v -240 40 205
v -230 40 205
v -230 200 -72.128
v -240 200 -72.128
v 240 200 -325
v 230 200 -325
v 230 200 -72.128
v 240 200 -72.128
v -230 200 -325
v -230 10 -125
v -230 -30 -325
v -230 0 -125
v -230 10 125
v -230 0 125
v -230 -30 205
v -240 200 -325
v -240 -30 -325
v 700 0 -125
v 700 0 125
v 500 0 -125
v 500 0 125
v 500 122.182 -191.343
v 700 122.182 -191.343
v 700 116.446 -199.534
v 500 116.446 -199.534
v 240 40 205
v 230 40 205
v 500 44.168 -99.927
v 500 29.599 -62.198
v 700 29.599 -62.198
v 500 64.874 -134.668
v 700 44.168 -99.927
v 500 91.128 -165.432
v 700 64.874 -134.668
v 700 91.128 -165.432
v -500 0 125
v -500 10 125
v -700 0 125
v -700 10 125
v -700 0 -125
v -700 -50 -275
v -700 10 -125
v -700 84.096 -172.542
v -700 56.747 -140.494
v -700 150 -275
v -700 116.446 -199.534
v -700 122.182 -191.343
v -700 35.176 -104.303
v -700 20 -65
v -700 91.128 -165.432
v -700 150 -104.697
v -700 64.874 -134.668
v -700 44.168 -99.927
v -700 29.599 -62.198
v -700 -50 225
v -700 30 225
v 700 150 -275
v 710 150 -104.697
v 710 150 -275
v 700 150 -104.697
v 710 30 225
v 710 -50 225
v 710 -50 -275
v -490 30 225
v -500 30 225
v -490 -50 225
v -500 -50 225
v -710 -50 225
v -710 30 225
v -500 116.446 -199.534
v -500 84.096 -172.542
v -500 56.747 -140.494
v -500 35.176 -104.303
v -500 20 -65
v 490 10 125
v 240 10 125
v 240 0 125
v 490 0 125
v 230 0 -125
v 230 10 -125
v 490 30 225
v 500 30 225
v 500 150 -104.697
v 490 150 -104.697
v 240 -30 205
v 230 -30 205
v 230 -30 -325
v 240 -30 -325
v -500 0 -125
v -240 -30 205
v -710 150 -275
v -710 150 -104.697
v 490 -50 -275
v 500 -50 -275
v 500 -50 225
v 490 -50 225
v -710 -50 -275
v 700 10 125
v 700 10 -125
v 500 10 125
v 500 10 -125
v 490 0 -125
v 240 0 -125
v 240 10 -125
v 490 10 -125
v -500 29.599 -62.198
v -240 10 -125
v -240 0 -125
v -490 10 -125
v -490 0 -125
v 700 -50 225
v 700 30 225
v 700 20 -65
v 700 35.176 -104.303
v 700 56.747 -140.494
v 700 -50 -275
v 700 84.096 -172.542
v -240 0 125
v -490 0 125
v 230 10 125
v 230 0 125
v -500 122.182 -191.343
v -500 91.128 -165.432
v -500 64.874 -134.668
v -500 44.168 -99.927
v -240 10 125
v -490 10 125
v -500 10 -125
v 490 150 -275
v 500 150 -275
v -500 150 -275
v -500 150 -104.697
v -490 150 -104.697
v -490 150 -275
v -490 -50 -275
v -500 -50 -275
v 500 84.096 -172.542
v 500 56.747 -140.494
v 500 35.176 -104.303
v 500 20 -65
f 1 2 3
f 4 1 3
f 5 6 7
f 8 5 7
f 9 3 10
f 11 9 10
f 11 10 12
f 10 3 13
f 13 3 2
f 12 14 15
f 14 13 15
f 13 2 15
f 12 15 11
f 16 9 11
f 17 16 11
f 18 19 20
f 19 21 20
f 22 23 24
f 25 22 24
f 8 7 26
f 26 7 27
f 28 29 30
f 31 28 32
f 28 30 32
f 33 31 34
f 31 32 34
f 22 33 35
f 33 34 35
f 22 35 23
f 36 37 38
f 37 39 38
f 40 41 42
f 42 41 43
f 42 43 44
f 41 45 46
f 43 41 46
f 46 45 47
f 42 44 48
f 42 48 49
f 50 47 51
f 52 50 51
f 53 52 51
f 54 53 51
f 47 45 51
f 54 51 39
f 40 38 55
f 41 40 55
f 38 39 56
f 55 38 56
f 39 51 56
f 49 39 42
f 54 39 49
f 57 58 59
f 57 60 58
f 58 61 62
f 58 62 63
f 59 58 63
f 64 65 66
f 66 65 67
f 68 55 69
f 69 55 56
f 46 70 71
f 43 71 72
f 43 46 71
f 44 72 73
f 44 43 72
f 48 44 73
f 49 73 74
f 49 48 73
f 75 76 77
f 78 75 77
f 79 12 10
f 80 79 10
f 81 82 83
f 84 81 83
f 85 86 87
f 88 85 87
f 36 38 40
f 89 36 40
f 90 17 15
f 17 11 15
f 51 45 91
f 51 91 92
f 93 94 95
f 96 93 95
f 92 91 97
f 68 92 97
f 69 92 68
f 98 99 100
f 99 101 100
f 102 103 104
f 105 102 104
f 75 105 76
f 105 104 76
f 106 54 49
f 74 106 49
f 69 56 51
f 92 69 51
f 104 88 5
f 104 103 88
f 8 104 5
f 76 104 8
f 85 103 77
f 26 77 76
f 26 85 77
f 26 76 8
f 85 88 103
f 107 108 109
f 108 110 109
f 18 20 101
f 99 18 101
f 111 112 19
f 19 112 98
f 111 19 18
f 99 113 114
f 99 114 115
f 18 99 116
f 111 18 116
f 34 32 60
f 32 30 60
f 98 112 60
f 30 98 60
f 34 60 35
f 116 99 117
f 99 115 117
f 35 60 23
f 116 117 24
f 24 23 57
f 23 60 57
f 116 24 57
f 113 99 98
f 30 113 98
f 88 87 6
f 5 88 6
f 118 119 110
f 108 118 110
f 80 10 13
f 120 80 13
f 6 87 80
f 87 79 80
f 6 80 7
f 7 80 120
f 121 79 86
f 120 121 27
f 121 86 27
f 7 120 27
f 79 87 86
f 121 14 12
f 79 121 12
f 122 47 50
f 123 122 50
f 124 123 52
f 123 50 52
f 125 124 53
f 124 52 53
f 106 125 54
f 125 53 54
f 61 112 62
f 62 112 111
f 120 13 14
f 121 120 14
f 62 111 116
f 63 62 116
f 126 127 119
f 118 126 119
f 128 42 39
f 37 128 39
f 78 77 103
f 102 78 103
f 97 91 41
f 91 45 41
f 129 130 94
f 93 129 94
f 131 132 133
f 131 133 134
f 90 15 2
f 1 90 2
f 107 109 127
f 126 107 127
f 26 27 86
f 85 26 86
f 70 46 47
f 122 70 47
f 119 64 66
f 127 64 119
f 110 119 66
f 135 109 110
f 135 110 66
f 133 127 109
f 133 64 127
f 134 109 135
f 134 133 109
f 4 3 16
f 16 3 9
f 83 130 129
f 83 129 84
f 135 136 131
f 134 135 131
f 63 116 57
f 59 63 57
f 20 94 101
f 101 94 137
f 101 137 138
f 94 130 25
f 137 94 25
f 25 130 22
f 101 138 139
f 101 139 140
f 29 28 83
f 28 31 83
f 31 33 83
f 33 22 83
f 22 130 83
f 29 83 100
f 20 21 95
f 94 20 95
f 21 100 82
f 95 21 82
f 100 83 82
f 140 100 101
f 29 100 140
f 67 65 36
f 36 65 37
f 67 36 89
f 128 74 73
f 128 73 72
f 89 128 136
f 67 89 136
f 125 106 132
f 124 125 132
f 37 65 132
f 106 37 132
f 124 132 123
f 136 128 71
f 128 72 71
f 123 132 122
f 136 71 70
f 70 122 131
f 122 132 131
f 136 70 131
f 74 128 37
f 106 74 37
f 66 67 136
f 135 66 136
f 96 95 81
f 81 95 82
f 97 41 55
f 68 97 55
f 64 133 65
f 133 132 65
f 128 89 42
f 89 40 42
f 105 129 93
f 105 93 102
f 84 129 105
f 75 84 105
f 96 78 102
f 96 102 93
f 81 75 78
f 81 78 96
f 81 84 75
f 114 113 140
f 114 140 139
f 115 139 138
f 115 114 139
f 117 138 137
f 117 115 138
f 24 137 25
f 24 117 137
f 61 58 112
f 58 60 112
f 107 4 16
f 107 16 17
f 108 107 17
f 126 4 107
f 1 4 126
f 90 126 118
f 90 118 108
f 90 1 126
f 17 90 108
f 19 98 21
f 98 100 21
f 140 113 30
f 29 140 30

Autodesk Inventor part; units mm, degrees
sketch "スケッチ1" plane through (0, 0, 0) normal (1, 0, 0) x (0, 1, 0)
  line L0 (10, 125) -> (0, 125)
  line L1 (0, 125) -> (0, -125)
  line L2 (0, -125) -> (10, -125)
  line L3 (10, -125) -> (10, 125)
  point P0 (0, 0)
  dimension "d0" = 250
  dimension "d1" = 10
extrude "押し出し1" add sketch "スケッチ1" along normal mid plane 1400
sketch "スケッチ2" plane through (700, 0, 0) normal (1, 0, 0) x (0, 0, -1)
  line L0 (104.6973, 150) -> (-225, 30)
  line L1 (-225, 30) -> (-225, -50)
  line L2 (-225, -50) -> (275, -50)
  line L3 (275, -50) -> (275, 150)
  line L4 (-125, 0) -> (125, 0) projected
  line L5 (-125, 10) -> (-125, 0) projected
  line L6 (125, 0) -> (125, 10) projected
  line L7 (125, 10) -> (-125, 10) projected
  line L8 (104.6973, 150) -> (275, 150)
  point P0 (0, 0)
  dimension "d4" = 50
  dimension "d5" = 20
  dimension "d6" = 200
  dimension "d7" = 500
  dimension "d8" = 100
  dimension "d9" = 80
extrude "押し出し3" add sketch "スケッチ2" along normal blind 10 contours L8 L3 L2 L1 L0 | L5 L7 L6 L4
ref_plane "作業平面1" through (230, 0, 0) normal (1, 0, 0) x (0, 1, 0)
ref_plane "作業平面2" through (600, 0, 0) normal (-1, 0, 0) x (0, 0, 1)
ref_plane "作業平面3" through (230, 0, 0) normal (1, 0, 0) x (0, 1, 0)
mirror "ミラー3" about plane through (600, 0, 0) normal (-1, 0, 0) of "押し出し3"
sketch "スケッチ4" plane through (230, 0, 0) normal (1, 0, 0) x (0, 1, 0)
  line L0 (40, 205) -> (-30, 205)
  line L1 (-30, 205) -> (-30, -325)
  line L2 (-30, -325) -> (200, -325)
  line L3 (200, -325) -> (200, -72.1281)
  line L4 (200, -72.1281) -> (40, 205)
  line L5 (0, -520.2563) -> (0, 349.2094) projected
  line L6 (30, 225) -> (-50, 225) projected
  line L7 (-50, 225) -> (-50, -275) projected
  line L8 (-50, -275) -> (150, -275) projected
  point P0 (0, 0)
  dimension "d25" = 230
  dimension "d26" = 20
  dimension "d27" = 20
  dimension "d28" = 50
  dimension "d29" = 30
  dimension "d30" = 70
extrude "押し出し5" add sketch "スケッチ4" along normal blind 10 contours L4 L3 L2 L5 L0 | L5 L8 L1 L0 | L5 L2 L1 L8
sketch "スケッチ5" plane through (700, 0, 0) normal (-1, 0, 0) x (0, 0, 1)
  arc A0 (-199.5342, 116.4458) -> (-65, 20) centre (4.9464, 259.6246) ccw
  arc A1 (-191.3426, 122.1816) -> (-62.1979, 29.5994) centre (4.9464, 259.6246) ccw
  line L0 (-65, 20) -> (-62.1979, 29.5994)
  line L1 (-191.3426, 122.1816) -> (-199.5342, 116.4458)
  line L2 (125, 10) -> (-125, 10) projected
  line L3 (-125, 10) -> (-125, 0) projected
  line L4 (-125, 10) -> (-199.5342, 116.4458)
  point P0 (0, 0)
  dimension "d33" = 10
  dimension "d36" = 10
  dimension "d37" = 60
  dimension "d42" = 125
extrude "押し出し6" add sketch "スケッチ5" along normal up to next
mirror "ミラー5" about plane through (0, 0, 0) normal (1, 0, 0) of "押し出し5", "押し出し3", "ミラー3", "押し出し6"
properties part number "F-wing"
